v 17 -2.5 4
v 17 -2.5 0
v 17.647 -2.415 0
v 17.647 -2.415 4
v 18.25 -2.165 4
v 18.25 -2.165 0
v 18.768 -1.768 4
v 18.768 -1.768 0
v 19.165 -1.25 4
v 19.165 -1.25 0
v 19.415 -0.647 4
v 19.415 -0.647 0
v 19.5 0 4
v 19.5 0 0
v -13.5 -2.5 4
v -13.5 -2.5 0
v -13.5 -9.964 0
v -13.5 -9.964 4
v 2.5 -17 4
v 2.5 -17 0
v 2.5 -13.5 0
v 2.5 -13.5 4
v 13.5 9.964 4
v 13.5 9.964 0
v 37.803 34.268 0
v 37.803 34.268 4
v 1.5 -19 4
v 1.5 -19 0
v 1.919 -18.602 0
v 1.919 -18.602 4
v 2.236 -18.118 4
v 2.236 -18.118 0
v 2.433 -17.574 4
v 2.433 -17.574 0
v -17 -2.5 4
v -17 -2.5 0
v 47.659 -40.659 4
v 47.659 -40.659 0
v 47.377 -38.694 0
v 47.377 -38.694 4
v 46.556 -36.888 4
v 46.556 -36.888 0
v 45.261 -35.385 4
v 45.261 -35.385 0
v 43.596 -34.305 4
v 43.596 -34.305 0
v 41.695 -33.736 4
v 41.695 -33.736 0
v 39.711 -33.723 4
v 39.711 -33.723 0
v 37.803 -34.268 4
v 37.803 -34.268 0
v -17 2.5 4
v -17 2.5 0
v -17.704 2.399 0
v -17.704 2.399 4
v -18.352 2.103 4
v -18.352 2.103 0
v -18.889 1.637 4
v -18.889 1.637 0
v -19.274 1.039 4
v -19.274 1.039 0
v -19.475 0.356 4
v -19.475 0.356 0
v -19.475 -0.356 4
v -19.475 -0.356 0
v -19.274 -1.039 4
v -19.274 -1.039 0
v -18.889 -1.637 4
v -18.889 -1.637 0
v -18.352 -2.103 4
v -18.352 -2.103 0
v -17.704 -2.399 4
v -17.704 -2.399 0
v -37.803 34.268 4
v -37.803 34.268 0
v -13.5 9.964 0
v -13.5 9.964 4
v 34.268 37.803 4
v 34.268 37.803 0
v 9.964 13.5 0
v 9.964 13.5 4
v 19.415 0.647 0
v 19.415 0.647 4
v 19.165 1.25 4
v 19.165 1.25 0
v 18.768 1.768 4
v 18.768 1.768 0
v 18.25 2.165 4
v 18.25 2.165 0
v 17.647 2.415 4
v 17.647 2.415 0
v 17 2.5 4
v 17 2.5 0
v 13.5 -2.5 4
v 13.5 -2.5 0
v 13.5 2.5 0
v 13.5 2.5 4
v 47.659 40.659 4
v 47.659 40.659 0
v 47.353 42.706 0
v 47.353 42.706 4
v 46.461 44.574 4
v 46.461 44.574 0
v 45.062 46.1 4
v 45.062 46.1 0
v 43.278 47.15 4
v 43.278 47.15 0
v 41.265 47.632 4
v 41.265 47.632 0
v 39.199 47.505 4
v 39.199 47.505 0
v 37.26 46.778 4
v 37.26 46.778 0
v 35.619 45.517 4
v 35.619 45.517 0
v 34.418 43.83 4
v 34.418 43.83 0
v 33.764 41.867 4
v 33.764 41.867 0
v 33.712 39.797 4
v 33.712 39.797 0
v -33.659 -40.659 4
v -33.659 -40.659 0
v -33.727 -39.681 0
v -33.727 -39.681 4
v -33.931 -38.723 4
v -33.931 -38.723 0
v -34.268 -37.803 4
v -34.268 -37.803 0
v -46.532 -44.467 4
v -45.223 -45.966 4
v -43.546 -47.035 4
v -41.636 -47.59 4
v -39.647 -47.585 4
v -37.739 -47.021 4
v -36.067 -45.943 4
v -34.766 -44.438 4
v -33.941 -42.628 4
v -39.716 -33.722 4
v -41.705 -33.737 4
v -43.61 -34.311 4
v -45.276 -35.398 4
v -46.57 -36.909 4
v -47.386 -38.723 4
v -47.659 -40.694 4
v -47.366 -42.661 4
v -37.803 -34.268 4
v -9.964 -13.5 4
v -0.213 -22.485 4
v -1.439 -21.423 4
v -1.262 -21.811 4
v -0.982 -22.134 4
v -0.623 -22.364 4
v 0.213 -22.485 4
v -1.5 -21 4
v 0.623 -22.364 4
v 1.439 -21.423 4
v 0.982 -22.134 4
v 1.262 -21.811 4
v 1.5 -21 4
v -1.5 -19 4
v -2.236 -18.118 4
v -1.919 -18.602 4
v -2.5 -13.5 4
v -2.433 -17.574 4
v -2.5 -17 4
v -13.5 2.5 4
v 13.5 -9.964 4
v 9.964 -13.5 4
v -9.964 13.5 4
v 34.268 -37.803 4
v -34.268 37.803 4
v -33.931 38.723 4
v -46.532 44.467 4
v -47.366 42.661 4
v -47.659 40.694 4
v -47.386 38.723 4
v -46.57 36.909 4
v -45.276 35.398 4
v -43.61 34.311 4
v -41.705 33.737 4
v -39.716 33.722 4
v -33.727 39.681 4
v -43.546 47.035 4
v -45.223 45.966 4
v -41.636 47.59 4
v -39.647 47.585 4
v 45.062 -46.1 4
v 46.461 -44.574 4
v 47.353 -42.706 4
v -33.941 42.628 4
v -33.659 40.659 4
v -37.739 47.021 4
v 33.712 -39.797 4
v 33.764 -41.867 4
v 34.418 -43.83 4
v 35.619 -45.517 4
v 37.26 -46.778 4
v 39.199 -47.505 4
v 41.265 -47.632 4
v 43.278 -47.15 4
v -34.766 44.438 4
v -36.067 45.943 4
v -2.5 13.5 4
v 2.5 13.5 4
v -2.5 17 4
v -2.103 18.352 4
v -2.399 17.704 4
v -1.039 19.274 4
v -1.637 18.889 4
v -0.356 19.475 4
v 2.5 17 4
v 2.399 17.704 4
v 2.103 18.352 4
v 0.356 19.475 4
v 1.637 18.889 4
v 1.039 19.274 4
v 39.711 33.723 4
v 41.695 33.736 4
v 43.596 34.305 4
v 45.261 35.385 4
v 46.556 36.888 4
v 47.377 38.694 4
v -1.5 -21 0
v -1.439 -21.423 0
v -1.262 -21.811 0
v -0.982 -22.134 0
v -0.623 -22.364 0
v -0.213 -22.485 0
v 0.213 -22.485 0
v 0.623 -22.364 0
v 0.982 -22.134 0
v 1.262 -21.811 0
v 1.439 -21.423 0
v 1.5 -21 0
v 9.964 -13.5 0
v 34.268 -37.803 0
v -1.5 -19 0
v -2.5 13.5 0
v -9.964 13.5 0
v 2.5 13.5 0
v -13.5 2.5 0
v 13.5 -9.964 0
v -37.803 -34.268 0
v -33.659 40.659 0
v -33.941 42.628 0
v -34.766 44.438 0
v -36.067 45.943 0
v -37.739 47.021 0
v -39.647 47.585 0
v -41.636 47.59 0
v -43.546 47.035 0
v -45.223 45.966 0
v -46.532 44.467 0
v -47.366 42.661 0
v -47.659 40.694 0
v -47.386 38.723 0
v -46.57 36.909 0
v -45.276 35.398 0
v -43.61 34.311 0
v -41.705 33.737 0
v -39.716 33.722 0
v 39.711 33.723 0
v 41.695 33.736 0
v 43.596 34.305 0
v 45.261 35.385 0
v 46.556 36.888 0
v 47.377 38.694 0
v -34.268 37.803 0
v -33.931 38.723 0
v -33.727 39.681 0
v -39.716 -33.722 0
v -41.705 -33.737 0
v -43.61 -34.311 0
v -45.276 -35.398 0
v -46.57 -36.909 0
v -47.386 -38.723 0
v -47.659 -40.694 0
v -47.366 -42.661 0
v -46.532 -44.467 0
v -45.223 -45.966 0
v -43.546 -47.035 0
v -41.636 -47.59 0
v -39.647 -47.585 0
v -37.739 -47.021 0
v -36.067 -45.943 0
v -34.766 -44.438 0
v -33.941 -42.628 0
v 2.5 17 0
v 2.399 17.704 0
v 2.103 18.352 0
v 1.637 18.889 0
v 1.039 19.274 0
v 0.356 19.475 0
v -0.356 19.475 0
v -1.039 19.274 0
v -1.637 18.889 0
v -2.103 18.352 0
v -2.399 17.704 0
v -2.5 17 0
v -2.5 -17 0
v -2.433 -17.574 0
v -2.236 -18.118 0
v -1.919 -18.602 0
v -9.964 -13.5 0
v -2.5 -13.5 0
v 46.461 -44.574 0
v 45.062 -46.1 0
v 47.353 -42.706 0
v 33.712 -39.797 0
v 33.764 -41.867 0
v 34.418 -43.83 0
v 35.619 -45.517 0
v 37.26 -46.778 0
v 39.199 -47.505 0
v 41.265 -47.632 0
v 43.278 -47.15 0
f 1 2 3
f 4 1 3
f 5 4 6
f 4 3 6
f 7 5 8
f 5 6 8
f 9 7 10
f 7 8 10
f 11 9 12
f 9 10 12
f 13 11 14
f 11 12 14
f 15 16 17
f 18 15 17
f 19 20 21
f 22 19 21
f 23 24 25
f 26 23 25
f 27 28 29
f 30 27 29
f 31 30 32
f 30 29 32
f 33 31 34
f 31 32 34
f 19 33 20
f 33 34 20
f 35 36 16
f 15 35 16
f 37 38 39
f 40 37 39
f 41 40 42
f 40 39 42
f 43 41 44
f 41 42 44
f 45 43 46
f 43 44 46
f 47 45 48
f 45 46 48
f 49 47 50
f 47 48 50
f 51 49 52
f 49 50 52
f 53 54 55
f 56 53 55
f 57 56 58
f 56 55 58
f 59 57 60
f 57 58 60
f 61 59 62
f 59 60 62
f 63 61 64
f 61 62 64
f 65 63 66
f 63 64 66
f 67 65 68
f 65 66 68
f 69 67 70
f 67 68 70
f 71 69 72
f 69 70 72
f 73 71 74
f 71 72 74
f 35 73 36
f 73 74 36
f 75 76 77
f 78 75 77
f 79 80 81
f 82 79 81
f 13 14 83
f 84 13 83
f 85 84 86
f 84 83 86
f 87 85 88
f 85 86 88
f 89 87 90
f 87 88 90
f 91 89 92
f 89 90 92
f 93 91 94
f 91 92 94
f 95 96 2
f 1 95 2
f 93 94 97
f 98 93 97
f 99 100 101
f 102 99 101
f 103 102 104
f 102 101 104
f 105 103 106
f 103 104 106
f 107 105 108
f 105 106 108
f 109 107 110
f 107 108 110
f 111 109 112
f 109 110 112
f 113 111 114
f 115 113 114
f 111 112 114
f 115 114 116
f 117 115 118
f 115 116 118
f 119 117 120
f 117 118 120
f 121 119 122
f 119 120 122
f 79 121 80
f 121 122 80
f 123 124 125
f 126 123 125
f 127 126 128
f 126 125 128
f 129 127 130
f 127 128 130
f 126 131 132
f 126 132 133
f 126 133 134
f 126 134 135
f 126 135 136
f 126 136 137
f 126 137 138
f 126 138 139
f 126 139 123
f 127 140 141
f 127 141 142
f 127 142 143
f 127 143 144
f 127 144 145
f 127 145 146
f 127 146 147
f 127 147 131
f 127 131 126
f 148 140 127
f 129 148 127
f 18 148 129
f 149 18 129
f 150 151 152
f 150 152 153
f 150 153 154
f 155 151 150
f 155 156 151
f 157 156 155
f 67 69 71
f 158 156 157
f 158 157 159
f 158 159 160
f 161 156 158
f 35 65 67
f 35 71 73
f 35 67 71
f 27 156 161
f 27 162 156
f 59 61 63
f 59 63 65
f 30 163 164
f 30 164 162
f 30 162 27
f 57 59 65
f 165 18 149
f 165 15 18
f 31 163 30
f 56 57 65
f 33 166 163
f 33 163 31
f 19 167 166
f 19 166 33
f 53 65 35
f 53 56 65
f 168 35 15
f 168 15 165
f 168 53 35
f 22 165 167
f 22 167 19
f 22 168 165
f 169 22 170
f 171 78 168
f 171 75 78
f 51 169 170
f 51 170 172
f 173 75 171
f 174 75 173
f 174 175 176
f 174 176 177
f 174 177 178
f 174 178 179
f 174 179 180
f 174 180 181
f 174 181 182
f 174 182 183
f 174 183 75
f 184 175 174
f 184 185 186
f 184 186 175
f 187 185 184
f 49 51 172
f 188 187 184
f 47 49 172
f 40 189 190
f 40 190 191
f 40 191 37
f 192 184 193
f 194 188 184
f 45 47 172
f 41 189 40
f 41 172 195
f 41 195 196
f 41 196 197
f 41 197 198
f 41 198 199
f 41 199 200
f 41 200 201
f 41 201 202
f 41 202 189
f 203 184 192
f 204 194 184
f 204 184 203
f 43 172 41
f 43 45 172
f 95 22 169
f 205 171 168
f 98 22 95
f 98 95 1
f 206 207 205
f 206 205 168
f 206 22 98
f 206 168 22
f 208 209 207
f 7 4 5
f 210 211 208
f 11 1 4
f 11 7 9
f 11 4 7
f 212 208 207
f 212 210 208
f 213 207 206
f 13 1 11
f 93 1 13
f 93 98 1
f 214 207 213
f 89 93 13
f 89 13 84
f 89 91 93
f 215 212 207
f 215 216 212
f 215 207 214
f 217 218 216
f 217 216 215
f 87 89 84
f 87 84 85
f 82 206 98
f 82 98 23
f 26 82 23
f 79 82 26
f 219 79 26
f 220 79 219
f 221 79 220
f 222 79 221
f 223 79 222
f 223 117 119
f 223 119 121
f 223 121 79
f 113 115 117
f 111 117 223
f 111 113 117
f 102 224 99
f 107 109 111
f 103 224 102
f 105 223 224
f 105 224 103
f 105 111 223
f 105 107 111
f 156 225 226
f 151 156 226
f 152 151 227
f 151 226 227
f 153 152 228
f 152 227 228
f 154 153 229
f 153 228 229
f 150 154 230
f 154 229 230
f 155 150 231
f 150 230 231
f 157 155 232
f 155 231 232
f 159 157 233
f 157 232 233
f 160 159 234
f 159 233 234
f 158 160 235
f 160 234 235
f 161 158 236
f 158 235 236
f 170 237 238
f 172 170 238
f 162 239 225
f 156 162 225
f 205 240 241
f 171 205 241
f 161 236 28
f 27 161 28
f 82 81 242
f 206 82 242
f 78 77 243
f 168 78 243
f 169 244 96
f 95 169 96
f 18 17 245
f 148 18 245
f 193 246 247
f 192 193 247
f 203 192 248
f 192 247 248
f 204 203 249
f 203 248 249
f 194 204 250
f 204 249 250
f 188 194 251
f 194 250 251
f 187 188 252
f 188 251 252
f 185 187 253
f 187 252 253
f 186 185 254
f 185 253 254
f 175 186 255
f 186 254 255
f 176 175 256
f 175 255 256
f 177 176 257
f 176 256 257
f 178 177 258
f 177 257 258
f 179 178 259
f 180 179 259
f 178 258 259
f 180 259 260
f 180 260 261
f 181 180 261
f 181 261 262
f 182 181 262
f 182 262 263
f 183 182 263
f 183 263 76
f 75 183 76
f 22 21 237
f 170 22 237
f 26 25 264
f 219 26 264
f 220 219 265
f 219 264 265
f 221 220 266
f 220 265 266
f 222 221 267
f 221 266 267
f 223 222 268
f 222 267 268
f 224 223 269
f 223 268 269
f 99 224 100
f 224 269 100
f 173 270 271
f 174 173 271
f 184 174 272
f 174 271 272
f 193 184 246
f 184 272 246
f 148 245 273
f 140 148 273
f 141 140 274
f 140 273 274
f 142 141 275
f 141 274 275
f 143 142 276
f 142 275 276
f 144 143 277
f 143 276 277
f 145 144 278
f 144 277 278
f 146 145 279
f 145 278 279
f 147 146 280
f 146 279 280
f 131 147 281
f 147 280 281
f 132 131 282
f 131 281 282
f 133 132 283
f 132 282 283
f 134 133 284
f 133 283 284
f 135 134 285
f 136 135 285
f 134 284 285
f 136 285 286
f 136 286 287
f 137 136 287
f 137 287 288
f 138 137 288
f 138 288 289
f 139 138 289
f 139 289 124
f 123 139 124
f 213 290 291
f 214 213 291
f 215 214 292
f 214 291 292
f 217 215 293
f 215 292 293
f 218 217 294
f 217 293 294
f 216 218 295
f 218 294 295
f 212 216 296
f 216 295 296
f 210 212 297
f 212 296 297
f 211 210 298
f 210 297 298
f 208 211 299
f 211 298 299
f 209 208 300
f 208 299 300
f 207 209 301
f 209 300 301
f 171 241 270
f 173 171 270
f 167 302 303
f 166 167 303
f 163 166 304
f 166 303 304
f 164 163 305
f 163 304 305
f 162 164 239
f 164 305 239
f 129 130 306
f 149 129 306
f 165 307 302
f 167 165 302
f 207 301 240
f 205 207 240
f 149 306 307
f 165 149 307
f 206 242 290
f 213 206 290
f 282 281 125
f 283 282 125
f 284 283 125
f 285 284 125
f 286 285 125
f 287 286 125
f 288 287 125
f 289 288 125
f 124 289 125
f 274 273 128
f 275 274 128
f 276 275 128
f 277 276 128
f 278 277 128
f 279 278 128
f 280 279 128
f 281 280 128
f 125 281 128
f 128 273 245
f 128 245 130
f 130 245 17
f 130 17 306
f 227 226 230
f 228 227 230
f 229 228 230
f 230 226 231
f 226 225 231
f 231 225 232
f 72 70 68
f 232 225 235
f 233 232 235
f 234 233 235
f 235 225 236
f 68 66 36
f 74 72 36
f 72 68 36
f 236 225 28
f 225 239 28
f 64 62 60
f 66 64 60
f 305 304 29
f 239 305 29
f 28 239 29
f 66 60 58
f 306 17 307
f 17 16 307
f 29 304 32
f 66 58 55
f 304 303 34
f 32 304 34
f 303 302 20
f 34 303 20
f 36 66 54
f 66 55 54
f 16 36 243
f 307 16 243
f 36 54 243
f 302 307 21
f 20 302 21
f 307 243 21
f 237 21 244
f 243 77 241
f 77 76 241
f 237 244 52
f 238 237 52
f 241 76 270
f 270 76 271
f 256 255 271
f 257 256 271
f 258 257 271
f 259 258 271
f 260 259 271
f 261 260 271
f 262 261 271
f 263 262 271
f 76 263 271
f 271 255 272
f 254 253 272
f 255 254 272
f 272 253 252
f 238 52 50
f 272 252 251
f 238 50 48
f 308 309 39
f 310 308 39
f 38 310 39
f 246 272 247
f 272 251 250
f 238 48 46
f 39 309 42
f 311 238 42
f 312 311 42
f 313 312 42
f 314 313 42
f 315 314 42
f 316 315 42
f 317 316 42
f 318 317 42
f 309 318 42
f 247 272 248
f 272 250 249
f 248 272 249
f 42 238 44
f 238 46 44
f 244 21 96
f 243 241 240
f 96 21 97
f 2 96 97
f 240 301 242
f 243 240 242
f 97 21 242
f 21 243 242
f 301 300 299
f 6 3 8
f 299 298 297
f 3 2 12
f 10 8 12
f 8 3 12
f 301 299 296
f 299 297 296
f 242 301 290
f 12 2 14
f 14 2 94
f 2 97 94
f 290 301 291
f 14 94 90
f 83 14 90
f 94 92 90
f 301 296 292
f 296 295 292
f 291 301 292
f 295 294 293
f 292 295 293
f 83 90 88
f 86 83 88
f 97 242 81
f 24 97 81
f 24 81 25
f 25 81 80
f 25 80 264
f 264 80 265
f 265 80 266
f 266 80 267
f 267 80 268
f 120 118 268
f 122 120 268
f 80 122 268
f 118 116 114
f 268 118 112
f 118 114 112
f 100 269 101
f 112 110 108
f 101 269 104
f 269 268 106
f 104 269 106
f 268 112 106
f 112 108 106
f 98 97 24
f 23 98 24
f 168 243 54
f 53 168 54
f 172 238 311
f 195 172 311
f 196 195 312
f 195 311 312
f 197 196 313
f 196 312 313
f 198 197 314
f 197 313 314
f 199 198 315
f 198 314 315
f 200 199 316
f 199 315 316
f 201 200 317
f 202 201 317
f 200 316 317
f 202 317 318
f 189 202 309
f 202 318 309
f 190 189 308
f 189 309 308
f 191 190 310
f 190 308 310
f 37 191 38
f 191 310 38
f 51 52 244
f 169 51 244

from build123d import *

# Parameters (mm, degrees)
F0_R     = 1.5
F0_R_2   = 1
F1_DEPTH = 4


with BuildPart() as f1:
    # F0 (on Top) → F1 (new body)
    with BuildSketch(Plane.XY):
        with BuildLine():
            ThreePointArc((47.6586399182, -40.6586399182), (44.4672613982, -34.7854463728), (37.803096369, -34.267562463))
            Line((37.803096369, -34.267562463), (42.4264068712, -38.8908729653))
            Line((42.4264068712, -38.8908729653), (40.6586399182, -40.6586399182))
            Line((40.6586399182, -40.6586399182), (38.8908729653, -42.4264068712))
            Line((38.8908729653, -42.4264068712), (34.267562463, -37.803096369))
            ThreePointArc((34.267562463, -37.803096369), (39.1987670105, -47.5047169769), (47.6586399182, -40.6586399182))
        make_face()
        with BuildLine():
            Line((-42.4264068712, 38.8908729653), (-40.6586399182, 40.6586399182))
            Line((-40.6586399182, 40.6586399182), (-38.8908729653, 42.4264068712))
            Line((-38.8908729653, 42.4264068712), (-34.267562463, 37.803096369))
            ThreePointArc((-34.267562463, 37.803096369), (-33.8125628596, 39.1987670105), (-33.6586399182, 40.6586399182))
            ThreePointArc((-33.6586399182, 40.6586399182), (-46.5318334637, 44.4672613982), (-37.803096369, 34.267562463))
            Line((-37.803096369, 34.267562463), (-42.4264068712, 38.8908729653))
        make_face()
        with BuildLine():
            Line((-42.4264068712, -38.8908729653), (-37.803096369, -34.267562463))
            ThreePointArc((-37.803096369, -34.267562463), (-46.5318334637, -44.4672613982), (-33.6586399182, -40.6586399182))
            ThreePointArc((-33.6586399182, -40.6586399182), (-33.8125628596, -39.1987670105), (-34.267562463, -37.803096369))
            Line((-34.267562463, -37.803096369), (-38.8908729653, -42.4264068712))
            Line((-38.8908729653, -42.4264068712), (-40.6586399182, -40.6586399182))
            Line((-40.6586399182, -40.6586399182), (-42.4264068712, -38.8908729653))
        make_face()
        with BuildLine():
            ThreePointArc((47.6586399182, 40.6586399182), (39.1987670105, 47.5047169769), (34.267562463, 37.803096369))
            Line((34.267562463, 37.803096369), (38.8908729653, 42.4264068712))
            Line((38.8908729653, 42.4264068712), (40.6586399182, 40.6586399182))
            Line((40.6586399182, 40.6586399182), (42.4264068712, 38.8908729653))
            Line((42.4264068712, 38.8908729653), (37.803096369, 34.267562463))
            ThreePointArc((37.803096369, 34.267562463), (44.4672613982, 34.7854463728), (47.6586399182, 40.6586399182))
        make_face()
        with BuildLine():
            Line((13.5, -13.5), (9.9644660941, -13.5))
            Line((9.9644660941, -13.5), (34.267562463, -37.803096369))
            ThreePointArc((34.267562463, -37.803096369), (34.8923586209, -36.6900129516), (35.7088924499, -35.7088924499))
            Line((35.7088924499, -35.7088924499), (13.5, -13.5))
        make_face()
        with BuildLine():
            Line((-9.9644660941, -13.5), (-13.5, -13.5))
            Line((-13.5, -13.5), (-35.7088924499, -35.7088924499))
            ThreePointArc((-35.7088924499, -35.7088924499), (-34.8923586209, -36.6900129516), (-34.267562463, -37.803096369))
            Line((-34.267562463, -37.803096369), (-9.9644660941, -13.5))
        make_face()
        with BuildLine():
            Line((37.803096369, -34.267562463), (13.5, -9.9644660941))
            Line((13.5, -9.9644660941), (13.5, -13.5))
            Line((13.5, -13.5), (35.7088924499, -35.7088924499))
            ThreePointArc((35.7088924499, -35.7088924499), (36.6900129516, -34.8923586209), (37.803096369, -34.267562463))
        make_face()
        with BuildLine():
            Line((-13.5, -13.5), (-13.5, -9.9644660941))
            Line((-13.5, -9.9644660941), (-37.803096369, -34.267562463))
            ThreePointArc((-37.803096369, -34.267562463), (-36.6900129516, -34.8923586209), (-35.7088924499, -35.7088924499))
            Line((-35.7088924499, -35.7088924499), (-13.5, -13.5))
        make_face()
        with BuildLine():
            Line((34.267562463, 37.803096369), (9.9644660941, 13.5))
            Line((9.9644660941, 13.5), (13.5, 13.5))
            Line((13.5, 13.5), (35.7088924499, 35.7088924499))
            ThreePointArc((35.7088924499, 35.7088924499), (34.8923586209, 36.6900129516), (34.267562463, 37.803096369))
        make_face()
        with BuildLine():
            Line((-35.7088924499, 35.7088924499), (-13.5, 13.5))
            Line((-13.5, 13.5), (-9.9644660941, 13.5))
            Line((-9.9644660941, 13.5), (-34.267562463, 37.803096369))
            ThreePointArc((-34.267562463, 37.803096369), (-34.8923586209, 36.6900129516), (-35.7088924499, 35.7088924499))
        make_face()
        with BuildLine():
            Line((35.7088924499, 35.7088924499), (13.5, 13.5))
            Line((13.5, 13.5), (13.5, 9.9644660941))
            Line((13.5, 9.9644660941), (37.803096369, 34.267562463))
            ThreePointArc((37.803096369, 34.267562463), (36.6900129516, 34.8923586209), (35.7088924499, 35.7088924499))
        make_face()
        with BuildLine():
            Line((-13.5, 9.9644660941), (-13.5, 13.5))
            Line((-13.5, 13.5), (-35.7088924499, 35.7088924499))
            ThreePointArc((-35.7088924499, 35.7088924499), (-36.6900129516, 34.8923586209), (-37.803096369, 34.267562463))
            Line((-37.803096369, 34.267562463), (-13.5, 9.9644660941))
        make_face()
        Polygon((-2.5, 13.5), (-9.9644660941, 13.5), (-7.2144660941, 10.75), (7.2144660941, 10.75), (9.9644660941, 13.5), (2.5, 13.5), align=None)
        Polygon((13.5, 9.9644660941), (10.75, 7.2144660941), (10.75, -7.2144660941), (13.5, -9.9644660941), (13.5, -2.5), (13.5, 2.5), align=None)
        Polygon((-10.75, 7.2144660941), (-13.5, 9.9644660941), (-13.5, 2.5), (-13.5, -2.5), (-13.5, -9.9644660941), (-10.75, -7.2144660941), align=None)
        Polygon((7.2144660941, -10.75), (-7.2144660941, -10.75), (-9.9644660941, -13.5), (-2.5, -13.5), (2.5, -13.5), (9.9644660941, -13.5), align=None)
        Polygon((-4.2855339059, -0.75), (-9.25, -5.7144660941), (-9.25, -9.25), (-1.767766953, -1.767766953), (-2.7855339059, -0.75), align=None)
        Polygon((-5.7144660941, 9.25), (-9.25, 9.25), (-1.767766953, 1.767766953), (-0.75, 2.7855339059), (-0.75, 4.2855339059), align=None)
        Polygon((2.7855339059, -0.75), (1.767766953, -1.767766953), (9.25, -9.25), (9.25, -5.7144660941), (4.2855339059, -0.75), align=None)
        Polygon((9.25, -9.25), (1.767766953, -1.767766953), (0.75, -2.7855339059), (0.75, -4.2855339059), (5.7144660941, -9.25), align=None)
        Polygon((-1.767766953, -1.767766953), (-9.25, -9.25), (-5.7144660941, -9.25), (-0.75, -4.2855339059), (-0.75, -2.7855339059), align=None)
        Polygon((9.25, 5.7144660941), (9.25, 9.25), (1.767766953, 1.767766953), (2.7855339059, 0.75), (4.2855339059, 0.75), align=None)
        Polygon((9.25, 9.25), (5.7144660941, 9.25), (0.75, 4.2855339059), (0.75, 2.7855339059), (1.767766953, 1.767766953), align=None)
        Polygon((-1.767766953, 1.767766953), (-9.25, 9.25), (-9.25, 5.7144660941), (-4.2855339059, 0.75), (-2.7855339059, 0.75), align=None)
        with BuildLine():
            ThreePointArc((19.5, 0), (18.767766953, 1.767766953), (17, 2.5))
            ThreePointArc((17, 2.5), (14.5, 0), (17, -2.5))
            ThreePointArc((17, -2.5), (18.767766953, -1.767766953), (19.5, 0))
        make_face()
        with Locations((17, 0)):
            Circle(F0_R, mode=Mode.SUBTRACT)
        with BuildLine():
            ThreePointArc((2.5, 17), (0, 19.5), (-2.5, 17))
            ThreePointArc((-2.5, 17), (0, 14.5), (2.5, 17))
        make_face()
        with Locations((0, 17)):
            Circle(F0_R, mode=Mode.SUBTRACT)
        with BuildLine():
            ThreePointArc((-14.5, 0), (-15.232233047, 1.767766953), (-17, 2.5))
            ThreePointArc((-17, 2.5), (-19.5, 0), (-17, -2.5))
            ThreePointArc((-17, -2.5), (-15.232233047, -1.767766953), (-14.5, 0))
        make_face()
        with Locations((-17, 0)):
            Circle(F0_R, mode=Mode.SUBTRACT)
        with BuildLine():
            ThreePointArc((2.5, -17), (0, -14.5), (-2.5, -17))
            ThreePointArc((-2.5, -17), (-2.2360679775, -18.1180339887), (-1.5, -19))
            ThreePointArc((-1.5, -19), (-0.790569421, -19.3717082432), (-1.25e-08, -19.5))
            ThreePointArc((-1.25e-08, -19.5), (0.7905694091, -19.3717082471), (1.5, -19))
            ThreePointArc((1.5, -19), (2.2360679775, -18.1180339887), (2.5, -17))
        make_face()
        with Locations((0, -17)):
            Circle(F0_R, mode=Mode.SUBTRACT)
        Polygon((10.75, -7.2144660941), (10.75, 7.2144660941), (9.25, 5.7144660941), (9.25, 0.75), (9.25, -0.75), (9.25, -5.7144660941), align=None)
        Polygon((-5.7144660941, -9.25), (-7.2144660941, -10.75), (7.2144660941, -10.75), (5.7144660941, -9.25), (0.75, -9.25), (-0.75, -9.25), align=None)
        Polygon((-9.25, 5.7144660941), (-10.75, 7.2144660941), (-10.75, -7.2144660941), (-9.25, -5.7144660941), (-9.25, -0.75), (-9.25, 0.75), align=None)
        Polygon((7.2144660941, 10.75), (-7.2144660941, 10.75), (-5.7144660941, 9.25), (-0.75, 9.25), (0.75, 9.25), (5.7144660941, 9.25), align=None)
        with BuildLine():
            ThreePointArc((35.7088924499, -35.7088924499), (34.8923586209, -36.6900129516), (34.267562463, -37.803096369))
            Line((34.267562463, -37.803096369), (38.8908729653, -42.4264068712))
            Line((38.8908729653, -42.4264068712), (40.6586399182, -40.6586399182))
            Line((40.6586399182, -40.6586399182), (35.7088924499, -35.7088924499))
        make_face()
        with BuildLine():
            ThreePointArc((-34.267562463, -37.803096369), (-34.8923586209, -36.6900129516), (-35.7088924499, -35.7088924499))
            Line((-35.7088924499, -35.7088924499), (-40.6586399182, -40.6586399182))
            Line((-40.6586399182, -40.6586399182), (-38.8908729653, -42.4264068712))
            Line((-38.8908729653, -42.4264068712), (-34.267562463, -37.803096369))
        make_face()
        with BuildLine():
            ThreePointArc((-35.7088924499, -35.7088924499), (-36.6900129516, -34.8923586209), (-37.803096369, -34.267562463))
            Line((-37.803096369, -34.267562463), (-42.4264068712, -38.8908729653))
            Line((-42.4264068712, -38.8908729653), (-40.6586399182, -40.6586399182))
            Line((-40.6586399182, -40.6586399182), (-35.7088924499, -35.7088924499))
        make_face()
        with BuildLine():
            Line((42.4264068712, -38.8908729653), (37.803096369, -34.267562463))
            ThreePointArc((37.803096369, -34.267562463), (36.6900129516, -34.8923586209), (35.7088924499, -35.7088924499))
            Line((35.7088924499, -35.7088924499), (40.6586399182, -40.6586399182))
            Line((40.6586399182, -40.6586399182), (42.4264068712, -38.8908729653))
        make_face()
        with BuildLine():
            Line((38.8908729653, 42.4264068712), (34.267562463, 37.803096369))
            ThreePointArc((34.267562463, 37.803096369), (34.8923586209, 36.6900129516), (35.7088924499, 35.7088924499))
            Line((35.7088924499, 35.7088924499), (40.6586399182, 40.6586399182))
            Line((40.6586399182, 40.6586399182), (38.8908729653, 42.4264068712))
        make_face()
        with BuildLine():
            Line((40.6586399182, 40.6586399182), (35.7088924499, 35.7088924499))
            ThreePointArc((35.7088924499, 35.7088924499), (36.6900129516, 34.8923586209), (37.803096369, 34.267562463))
            Line((37.803096369, 34.267562463), (42.4264068712, 38.8908729653))
            Line((42.4264068712, 38.8908729653), (40.6586399182, 40.6586399182))
        make_face()
        with BuildLine():
            ThreePointArc((-37.803096369, 34.267562463), (-36.6900129516, 34.8923586209), (-35.7088924499, 35.7088924499))
            Line((-35.7088924499, 35.7088924499), (-40.6586399182, 40.6586399182))
            Line((-40.6586399182, 40.6586399182), (-42.4264068712, 38.8908729653))
            Line((-42.4264068712, 38.8908729653), (-37.803096369, 34.267562463))
        make_face()
        with BuildLine():
            Line((-40.6586399182, 40.6586399182), (-35.7088924499, 35.7088924499))
            ThreePointArc((-35.7088924499, 35.7088924499), (-34.8923586209, 36.6900129516), (-34.267562463, 37.803096369))
            Line((-34.267562463, 37.803096369), (-38.8908729653, 42.4264068712))
            Line((-38.8908729653, 42.4264068712), (-40.6586399182, 40.6586399182))
        make_face()
        Polygon((4.2855339059, -0.75), (9.25, -5.7144660941), (9.25, -0.75), align=None)
        Polygon((0.75, -9.25), (5.7144660941, -9.25), (0.75, -4.2855339059), align=None)
        Polygon((-0.75, -4.2855339059), (-5.7144660941, -9.25), (-0.75, -9.25), align=None)
        Polygon((0.75, 4.2855339059), (5.7144660941, 9.25), (0.75, 9.25), align=None)
        Polygon((-0.75, 9.25), (-5.7144660941, 9.25), (-0.75, 4.2855339059), align=None)
        Polygon((-4.2855339059, 0.75), (-9.25, 5.7144660941), (-9.25, 0.75), align=None)
        Polygon((-9.25, -0.75), (-9.25, -5.7144660941), (-4.2855339059, -0.75), align=None)
        Polygon((9.25, 0.75), (9.25, 5.7144660941), (4.2855339059, 0.75), align=None)
        Polygon((-9.9644660941, 13.5), (-13.5, 13.5), (-10.75, 10.75), (-7.2144660941, 10.75), align=None)
        Polygon((13.5, 13.5), (10.75, 10.75), (10.75, 7.2144660941), (13.5, 9.9644660941), align=None)
        Polygon((9.9644660941, 13.5), (7.2144660941, 10.75), (10.75, 10.75), (13.5, 13.5), align=None)
        Polygon((-10.75, 10.75), (-13.5, 13.5), (-13.5, 9.9644660941), (-10.75, 7.2144660941), align=None)
        Polygon((13.5, -9.9644660941), (10.75, -7.2144660941), (10.75, -10.75), (13.5, -13.5), align=None)
        Polygon((-7.2144660941, -10.75), (-10.75, -10.75), (-13.5, -13.5), (-9.9644660941, -13.5), align=None)
        Polygon((10.75, -10.75), (7.2144660941, -10.75), (9.9644660941, -13.5), (13.5, -13.5), align=None)
        Polygon((-10.75, -10.75), (-10.75, -7.2144660941), (-13.5, -9.9644660941), (-13.5, -13.5), align=None)
        Polygon((4.2855339059, 0.75), (3.5355339059, 0), (4.2855339059, -0.75), (9.25, -0.75), (9.25, 0.75), align=None)
        Polygon((-3.5355339059, 0), (-4.2855339059, 0.75), (-9.25, 0.75), (-9.25, -0.75), (-4.2855339059, -0.75), align=None)
        Polygon((0.75, -4.2855339059), (0, -3.5355339059), (-0.75, -4.2855339059), (-0.75, -9.25), (0.75, -9.25), align=None)
        Polygon((-0.75, 9.25), (-0.75, 4.2855339059), (0, 3.5355339059), (0.75, 4.2855339059), (0.75, 9.25), align=None)
        with BuildLine():
            Line((2.5, -13.5), (-2.5, -13.5))
            Line((-2.5, -13.5), (-2.5, -17))
            ThreePointArc((-2.5, -17), (0, -14.5), (2.5, -17))
            Line((2.5, -17), (2.5, -13.5))
        make_face()
        with BuildLine():
            Line((-13.5, -2.5), (-13.5, 2.5))
            Line((-13.5, 2.5), (-17, 2.5))
            ThreePointArc((-17, 2.5), (-15.232233047, 1.767766953), (-14.5, 0))
            ThreePointArc((-14.5, 0), (-15.232233047, -1.767766953), (-17, -2.5))
            Line((-17, -2.5), (-13.5, -2.5))
        make_face()
        with BuildLine():
            Line((-2.5, 17), (-2.5, 13.5))
            Line((-2.5, 13.5), (2.5, 13.5))
            Line((2.5, 13.5), (2.5, 17))
            ThreePointArc((2.5, 17), (0, 14.5), (-2.5, 17))
        make_face()
        with BuildLine():
            Line((17, 2.5), (13.5, 2.5))
            Line((13.5, 2.5), (13.5, -2.5))
            Line((13.5, -2.5), (17, -2.5))
            ThreePointArc((17, -2.5), (14.5, 0), (17, 2.5))
        make_face()
        with BuildLine():
            ThreePointArc((1.5, -21), (1.0606601674, -19.9393398238), (-1.25e-08, -19.5))
            ThreePointArc((-1.25e-08, -19.5), (-1.0606601762, -19.9393398326), (-1.5, -21))
            ThreePointArc((-1.5, -21), (0, -22.5), (1.5, -21))
        make_face()
        with Locations((0, -21)):
            Circle(F0_R_2, mode=Mode.SUBTRACT)
        with Locations((17, 0)):
            Circle(F0_R)
        with Locations((0, 17)):
            Circle(F0_R)
        with Locations((-17, 0)):
            Circle(F0_R)
        with Locations((0, -17)):
            Circle(F0_R)
        Polygon((10.75, -10.75), (10.75, -7.2144660941), (9.25, -5.7144660941), (9.25, -9.25), align=None)
        Polygon((10.75, 7.2144660941), (10.75, 10.75), (9.25, 9.25), (9.25, 5.7144660941), align=None)
        Polygon((5.7144660941, -9.25), (7.2144660941, -10.75), (10.75, -10.75), (9.25, -9.25), align=None)
        Polygon((-9.25, 9.25), (-10.75, 10.75), (-10.75, 7.2144660941), (-9.25, 5.7144660941), align=None)
        Polygon((-9.25, -5.7144660941), (-10.75, -7.2144660941), (-10.75, -10.75), (-9.25, -9.25), align=None)
        Polygon((10.75, 10.75), (7.2144660941, 10.75), (5.7144660941, 9.25), (9.25, 9.25), align=None)
        Polygon((-9.25, -9.25), (-10.75, -10.75), (-7.2144660941, -10.75), (-5.7144660941, -9.25), align=None)
        Polygon((-7.2144660941, 10.75), (-10.75, 10.75), (-9.25, 9.25), (-5.7144660941, 9.25), align=None)
        Polygon((0.75, -0.75), (-0.75, -0.75), (-0.75, -2.7855339059), (0, -3.5355339059), (0.75, -2.7855339059), align=None)
        Polygon((-0.75, -0.75), (-0.75, 0.75), (-2.7855339059, 0.75), (-3.5355339059, 0), (-2.7855339059, -0.75), align=None)
        Polygon((-0.75, 2.7855339059), (-0.75, 0.75), (0.75, 0.75), (0.75, 2.7855339059), (0, 3.5355339059), align=None)
        Polygon((2.7855339059, 0.75), (0.75, 0.75), (0.75, -0.75), (2.7855339059, -0.75), (3.5355339059, 0), align=None)
        with Locations((0, -21)):
            Circle(F0_R_2)
        Polygon((2.7855339059, -0.75), (0.75, -0.75), (1.767766953, -1.767766953), align=None)
        Polygon((-0.75, 2.7855339059), (-1.767766953, 1.767766953), (-0.75, 0.75), align=None)
        Polygon((-0.75, -2.7855339059), (-0.75, -0.75), (-1.767766953, -1.767766953), align=None)
        Polygon((-1.767766953, -1.767766953), (-0.75, -0.75), (-2.7855339059, -0.75), align=None)
        Polygon((1.767766953, -1.767766953), (0.75, -0.75), (0.75, -2.7855339059), align=None)
        Polygon((1.767766953, 1.767766953), (0.75, 0.75), (2.7855339059, 0.75), align=None)
        Polygon((0.75, 2.7855339059), (0.75, 0.75), (1.767766953, 1.767766953), align=None)
        Polygon((-0.75, 0.75), (-1.767766953, 1.767766953), (-2.7855339059, 0.75), align=None)
        with BuildLine():
            ThreePointArc((-1.25e-08, -19.5), (-0.790569421, -19.3717082432), (-1.5, -19))
            Line((-1.5, -19), (-1.5, -21))
            ThreePointArc((-1.5, -21), (-1.0606601762, -19.9393398326), (-1.25e-08, -19.5))
        make_face()
        with BuildLine():
            Line((1.5, -21), (1.5, -19))
            ThreePointArc((1.5, -19), (0.7905694091, -19.3717082471), (-1.25e-08, -19.5))
            ThreePointArc((-1.25e-08, -19.5), (1.0606601674, -19.9393398238), (1.5, -21))
        make_face()
        Polygon((0.75, 4.2855339059), (0, 3.5355339059), (0.75, 2.7855339059), align=None)
        Polygon((0, -3.5355339059), (-0.75, -2.7855339059), (-0.75, -4.2855339059), align=None)
        Polygon((0.75, -4.2855339059), (0.75, -2.7855339059), (0, -3.5355339059), align=None)
        Polygon((-0.75, 4.2855339059), (-0.75, 2.7855339059), (0, 3.5355339059), align=None)
        Polygon((3.5355339059, 0), (2.7855339059, -0.75), (4.2855339059, -0.75), align=None)
        Polygon((4.2855339059, 0.75), (2.7855339059, 0.75), (3.5355339059, 0), align=None)
        Polygon((-3.5355339059, 0), (-2.7855339059, 0.75), (-4.2855339059, 0.75), align=None)
        Polygon((0.75, 0.75), (-0.75, 0.75), (0, 0), align=None)
        Polygon((0.75, -0.75), (0, 0), (-0.75, -0.75), align=None)
        Polygon((-2.7855339059, -0.75), (-3.5355339059, 0), (-4.2855339059, -0.75), align=None)
        Polygon((0, 0), (-0.75, 0.75), (-0.75, -0.75), align=None)
        Polygon((0.75, 0.75), (0, 0), (0.75, -0.75), align=None)
    extrude(amount=F1_DEPTH)


solid = f1.part
